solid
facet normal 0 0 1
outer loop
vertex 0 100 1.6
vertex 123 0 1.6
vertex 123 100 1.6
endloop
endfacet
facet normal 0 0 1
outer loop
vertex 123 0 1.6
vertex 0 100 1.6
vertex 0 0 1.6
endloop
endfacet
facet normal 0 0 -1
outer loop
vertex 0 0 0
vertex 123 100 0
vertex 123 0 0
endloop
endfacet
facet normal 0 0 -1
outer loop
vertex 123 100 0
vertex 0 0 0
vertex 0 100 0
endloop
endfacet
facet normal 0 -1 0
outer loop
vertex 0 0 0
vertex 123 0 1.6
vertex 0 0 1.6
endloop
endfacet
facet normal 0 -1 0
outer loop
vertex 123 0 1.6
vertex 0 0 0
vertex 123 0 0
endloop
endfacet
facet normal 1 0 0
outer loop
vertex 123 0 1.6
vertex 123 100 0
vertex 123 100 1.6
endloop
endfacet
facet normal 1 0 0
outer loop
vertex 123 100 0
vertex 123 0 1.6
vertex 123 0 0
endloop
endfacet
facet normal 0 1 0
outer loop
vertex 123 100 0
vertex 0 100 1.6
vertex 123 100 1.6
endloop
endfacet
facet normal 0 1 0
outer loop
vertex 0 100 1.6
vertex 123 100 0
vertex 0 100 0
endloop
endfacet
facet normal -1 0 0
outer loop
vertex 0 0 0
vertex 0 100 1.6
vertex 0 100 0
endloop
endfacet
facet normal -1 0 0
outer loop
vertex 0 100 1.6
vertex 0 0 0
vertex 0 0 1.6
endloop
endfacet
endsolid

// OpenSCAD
$fn = 64;

board_x = 123.0;
board_y = 100.0;
board_th = 1.6;

color([0.05, 0.45, 0.12])
cube([board_x, board_y, board_th], center=false);
